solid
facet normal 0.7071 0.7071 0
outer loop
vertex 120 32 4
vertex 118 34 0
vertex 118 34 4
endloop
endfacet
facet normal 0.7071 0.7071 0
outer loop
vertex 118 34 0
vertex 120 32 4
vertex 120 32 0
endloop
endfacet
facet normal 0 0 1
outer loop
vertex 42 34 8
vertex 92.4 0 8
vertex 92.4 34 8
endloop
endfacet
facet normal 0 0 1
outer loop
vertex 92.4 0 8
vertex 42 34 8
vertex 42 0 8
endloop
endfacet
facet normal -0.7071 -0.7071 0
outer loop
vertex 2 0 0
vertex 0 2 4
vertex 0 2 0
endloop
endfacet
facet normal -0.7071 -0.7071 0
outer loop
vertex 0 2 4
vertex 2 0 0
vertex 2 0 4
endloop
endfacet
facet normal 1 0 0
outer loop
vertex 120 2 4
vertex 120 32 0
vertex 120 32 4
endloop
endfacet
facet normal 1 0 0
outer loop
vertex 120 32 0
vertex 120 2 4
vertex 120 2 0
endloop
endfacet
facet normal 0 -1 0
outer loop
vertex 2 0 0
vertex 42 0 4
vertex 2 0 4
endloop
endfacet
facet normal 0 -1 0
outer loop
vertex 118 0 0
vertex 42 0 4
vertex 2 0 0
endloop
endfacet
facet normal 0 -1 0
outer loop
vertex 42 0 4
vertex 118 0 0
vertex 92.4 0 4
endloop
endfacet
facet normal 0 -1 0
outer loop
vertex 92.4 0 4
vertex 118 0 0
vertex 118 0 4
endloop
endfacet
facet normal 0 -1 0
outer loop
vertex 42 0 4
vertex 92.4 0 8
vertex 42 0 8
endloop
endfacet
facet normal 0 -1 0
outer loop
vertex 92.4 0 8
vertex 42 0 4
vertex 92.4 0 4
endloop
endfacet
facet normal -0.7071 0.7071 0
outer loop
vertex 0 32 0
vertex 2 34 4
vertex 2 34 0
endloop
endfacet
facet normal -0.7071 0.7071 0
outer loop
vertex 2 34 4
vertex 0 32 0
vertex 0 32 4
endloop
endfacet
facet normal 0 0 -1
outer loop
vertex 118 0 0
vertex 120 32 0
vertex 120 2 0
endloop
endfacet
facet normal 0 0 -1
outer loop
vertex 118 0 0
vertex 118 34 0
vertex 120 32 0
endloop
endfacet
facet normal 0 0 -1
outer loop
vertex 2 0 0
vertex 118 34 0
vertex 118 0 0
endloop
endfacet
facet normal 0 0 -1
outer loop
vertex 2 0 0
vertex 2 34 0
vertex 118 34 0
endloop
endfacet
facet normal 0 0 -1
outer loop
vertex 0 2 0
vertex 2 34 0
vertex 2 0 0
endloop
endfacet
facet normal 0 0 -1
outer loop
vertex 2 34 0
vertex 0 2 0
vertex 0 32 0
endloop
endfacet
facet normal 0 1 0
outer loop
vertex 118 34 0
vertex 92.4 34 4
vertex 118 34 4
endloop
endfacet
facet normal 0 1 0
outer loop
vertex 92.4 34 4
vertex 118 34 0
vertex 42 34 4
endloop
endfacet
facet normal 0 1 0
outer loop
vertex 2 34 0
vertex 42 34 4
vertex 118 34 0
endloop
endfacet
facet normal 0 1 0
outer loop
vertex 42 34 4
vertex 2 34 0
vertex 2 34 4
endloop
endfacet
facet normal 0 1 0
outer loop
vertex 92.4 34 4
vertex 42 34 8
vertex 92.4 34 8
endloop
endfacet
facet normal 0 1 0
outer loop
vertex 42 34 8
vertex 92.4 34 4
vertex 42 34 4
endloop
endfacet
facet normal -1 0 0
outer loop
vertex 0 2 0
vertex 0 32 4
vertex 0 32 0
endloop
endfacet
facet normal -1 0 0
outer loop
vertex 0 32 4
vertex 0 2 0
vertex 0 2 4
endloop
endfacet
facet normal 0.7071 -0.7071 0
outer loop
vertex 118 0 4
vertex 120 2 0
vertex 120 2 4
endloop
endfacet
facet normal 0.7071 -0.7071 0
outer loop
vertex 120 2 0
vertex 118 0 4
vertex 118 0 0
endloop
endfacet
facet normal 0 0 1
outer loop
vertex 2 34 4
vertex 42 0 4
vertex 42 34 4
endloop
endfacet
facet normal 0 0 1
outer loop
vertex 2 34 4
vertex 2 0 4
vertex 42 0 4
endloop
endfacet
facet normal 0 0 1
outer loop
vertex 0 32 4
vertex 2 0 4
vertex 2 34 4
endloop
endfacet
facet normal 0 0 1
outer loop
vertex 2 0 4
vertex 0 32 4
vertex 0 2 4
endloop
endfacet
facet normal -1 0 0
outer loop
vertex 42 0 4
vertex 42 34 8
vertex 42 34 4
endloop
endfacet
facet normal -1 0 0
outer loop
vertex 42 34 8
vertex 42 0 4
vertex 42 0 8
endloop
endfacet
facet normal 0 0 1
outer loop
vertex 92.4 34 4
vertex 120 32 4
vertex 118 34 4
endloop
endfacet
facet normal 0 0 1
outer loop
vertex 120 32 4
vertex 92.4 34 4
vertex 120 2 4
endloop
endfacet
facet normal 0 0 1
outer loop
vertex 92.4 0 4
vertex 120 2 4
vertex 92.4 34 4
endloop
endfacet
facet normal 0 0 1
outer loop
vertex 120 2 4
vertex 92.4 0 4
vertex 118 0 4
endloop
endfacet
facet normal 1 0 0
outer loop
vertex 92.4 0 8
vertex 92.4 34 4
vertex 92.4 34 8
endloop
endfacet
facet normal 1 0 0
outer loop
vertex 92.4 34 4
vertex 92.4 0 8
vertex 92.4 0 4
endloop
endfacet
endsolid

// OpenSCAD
$fn = 32;

// ----------------------------------------------------------------------
// Stepped bar: centerstep, 120 x 34 x 8/4 mm
// ----------------------------------------------------------------------

// --- parameters (mm) ---
bar_l = 120;              // bar length, X
bar_w = 34;               // bar width, Y
plate_t = 8;              // thickness of the thick zone, Z
thin_t = 4;               // thickness of the thin zone
corner_c = 2;             // corner chamfer of the bar
step_cut = 4;             // material removed from the thin zone
thick_from = 42;          // start of the thick middle zone
thick_to = 92.4;          // end of the thick middle zone
depth_1 = 4;              // depth of cut 1 from the top face
depth_2 = 4;              // depth of cut 2 from the top face
fit_tol = 0.02;           // declared fit tolerance (prompt contract)
free_tol = 0.2;           // declared free tolerance (prompt contract)

profile = [[2, 0], [118, 0], [120, 2], [120, 32], [118, 34], [2, 34], [0, 32], [0, 2]];  // primary outline, 8 points, counter clockwise
void_1 = [[-1, -1], [42, -1], [42, 35], [-1, 35]];  // thin left end, 4 points
void_2 = [[92.4, -1], [121, -1], [121, 35], [92.4, 35]];  // thin right end, 4 points

// --- the one profile operation ---
difference() {
  linear_extrude(height = plate_t) polygon(points = profile);
  translate([0, 0, plate_t - depth_1])
    linear_extrude(height = depth_1 + 1) polygon(points = void_1);
  translate([0, 0, plate_t - depth_2])
    linear_extrude(height = depth_2 + 1) polygon(points = void_2);
}
